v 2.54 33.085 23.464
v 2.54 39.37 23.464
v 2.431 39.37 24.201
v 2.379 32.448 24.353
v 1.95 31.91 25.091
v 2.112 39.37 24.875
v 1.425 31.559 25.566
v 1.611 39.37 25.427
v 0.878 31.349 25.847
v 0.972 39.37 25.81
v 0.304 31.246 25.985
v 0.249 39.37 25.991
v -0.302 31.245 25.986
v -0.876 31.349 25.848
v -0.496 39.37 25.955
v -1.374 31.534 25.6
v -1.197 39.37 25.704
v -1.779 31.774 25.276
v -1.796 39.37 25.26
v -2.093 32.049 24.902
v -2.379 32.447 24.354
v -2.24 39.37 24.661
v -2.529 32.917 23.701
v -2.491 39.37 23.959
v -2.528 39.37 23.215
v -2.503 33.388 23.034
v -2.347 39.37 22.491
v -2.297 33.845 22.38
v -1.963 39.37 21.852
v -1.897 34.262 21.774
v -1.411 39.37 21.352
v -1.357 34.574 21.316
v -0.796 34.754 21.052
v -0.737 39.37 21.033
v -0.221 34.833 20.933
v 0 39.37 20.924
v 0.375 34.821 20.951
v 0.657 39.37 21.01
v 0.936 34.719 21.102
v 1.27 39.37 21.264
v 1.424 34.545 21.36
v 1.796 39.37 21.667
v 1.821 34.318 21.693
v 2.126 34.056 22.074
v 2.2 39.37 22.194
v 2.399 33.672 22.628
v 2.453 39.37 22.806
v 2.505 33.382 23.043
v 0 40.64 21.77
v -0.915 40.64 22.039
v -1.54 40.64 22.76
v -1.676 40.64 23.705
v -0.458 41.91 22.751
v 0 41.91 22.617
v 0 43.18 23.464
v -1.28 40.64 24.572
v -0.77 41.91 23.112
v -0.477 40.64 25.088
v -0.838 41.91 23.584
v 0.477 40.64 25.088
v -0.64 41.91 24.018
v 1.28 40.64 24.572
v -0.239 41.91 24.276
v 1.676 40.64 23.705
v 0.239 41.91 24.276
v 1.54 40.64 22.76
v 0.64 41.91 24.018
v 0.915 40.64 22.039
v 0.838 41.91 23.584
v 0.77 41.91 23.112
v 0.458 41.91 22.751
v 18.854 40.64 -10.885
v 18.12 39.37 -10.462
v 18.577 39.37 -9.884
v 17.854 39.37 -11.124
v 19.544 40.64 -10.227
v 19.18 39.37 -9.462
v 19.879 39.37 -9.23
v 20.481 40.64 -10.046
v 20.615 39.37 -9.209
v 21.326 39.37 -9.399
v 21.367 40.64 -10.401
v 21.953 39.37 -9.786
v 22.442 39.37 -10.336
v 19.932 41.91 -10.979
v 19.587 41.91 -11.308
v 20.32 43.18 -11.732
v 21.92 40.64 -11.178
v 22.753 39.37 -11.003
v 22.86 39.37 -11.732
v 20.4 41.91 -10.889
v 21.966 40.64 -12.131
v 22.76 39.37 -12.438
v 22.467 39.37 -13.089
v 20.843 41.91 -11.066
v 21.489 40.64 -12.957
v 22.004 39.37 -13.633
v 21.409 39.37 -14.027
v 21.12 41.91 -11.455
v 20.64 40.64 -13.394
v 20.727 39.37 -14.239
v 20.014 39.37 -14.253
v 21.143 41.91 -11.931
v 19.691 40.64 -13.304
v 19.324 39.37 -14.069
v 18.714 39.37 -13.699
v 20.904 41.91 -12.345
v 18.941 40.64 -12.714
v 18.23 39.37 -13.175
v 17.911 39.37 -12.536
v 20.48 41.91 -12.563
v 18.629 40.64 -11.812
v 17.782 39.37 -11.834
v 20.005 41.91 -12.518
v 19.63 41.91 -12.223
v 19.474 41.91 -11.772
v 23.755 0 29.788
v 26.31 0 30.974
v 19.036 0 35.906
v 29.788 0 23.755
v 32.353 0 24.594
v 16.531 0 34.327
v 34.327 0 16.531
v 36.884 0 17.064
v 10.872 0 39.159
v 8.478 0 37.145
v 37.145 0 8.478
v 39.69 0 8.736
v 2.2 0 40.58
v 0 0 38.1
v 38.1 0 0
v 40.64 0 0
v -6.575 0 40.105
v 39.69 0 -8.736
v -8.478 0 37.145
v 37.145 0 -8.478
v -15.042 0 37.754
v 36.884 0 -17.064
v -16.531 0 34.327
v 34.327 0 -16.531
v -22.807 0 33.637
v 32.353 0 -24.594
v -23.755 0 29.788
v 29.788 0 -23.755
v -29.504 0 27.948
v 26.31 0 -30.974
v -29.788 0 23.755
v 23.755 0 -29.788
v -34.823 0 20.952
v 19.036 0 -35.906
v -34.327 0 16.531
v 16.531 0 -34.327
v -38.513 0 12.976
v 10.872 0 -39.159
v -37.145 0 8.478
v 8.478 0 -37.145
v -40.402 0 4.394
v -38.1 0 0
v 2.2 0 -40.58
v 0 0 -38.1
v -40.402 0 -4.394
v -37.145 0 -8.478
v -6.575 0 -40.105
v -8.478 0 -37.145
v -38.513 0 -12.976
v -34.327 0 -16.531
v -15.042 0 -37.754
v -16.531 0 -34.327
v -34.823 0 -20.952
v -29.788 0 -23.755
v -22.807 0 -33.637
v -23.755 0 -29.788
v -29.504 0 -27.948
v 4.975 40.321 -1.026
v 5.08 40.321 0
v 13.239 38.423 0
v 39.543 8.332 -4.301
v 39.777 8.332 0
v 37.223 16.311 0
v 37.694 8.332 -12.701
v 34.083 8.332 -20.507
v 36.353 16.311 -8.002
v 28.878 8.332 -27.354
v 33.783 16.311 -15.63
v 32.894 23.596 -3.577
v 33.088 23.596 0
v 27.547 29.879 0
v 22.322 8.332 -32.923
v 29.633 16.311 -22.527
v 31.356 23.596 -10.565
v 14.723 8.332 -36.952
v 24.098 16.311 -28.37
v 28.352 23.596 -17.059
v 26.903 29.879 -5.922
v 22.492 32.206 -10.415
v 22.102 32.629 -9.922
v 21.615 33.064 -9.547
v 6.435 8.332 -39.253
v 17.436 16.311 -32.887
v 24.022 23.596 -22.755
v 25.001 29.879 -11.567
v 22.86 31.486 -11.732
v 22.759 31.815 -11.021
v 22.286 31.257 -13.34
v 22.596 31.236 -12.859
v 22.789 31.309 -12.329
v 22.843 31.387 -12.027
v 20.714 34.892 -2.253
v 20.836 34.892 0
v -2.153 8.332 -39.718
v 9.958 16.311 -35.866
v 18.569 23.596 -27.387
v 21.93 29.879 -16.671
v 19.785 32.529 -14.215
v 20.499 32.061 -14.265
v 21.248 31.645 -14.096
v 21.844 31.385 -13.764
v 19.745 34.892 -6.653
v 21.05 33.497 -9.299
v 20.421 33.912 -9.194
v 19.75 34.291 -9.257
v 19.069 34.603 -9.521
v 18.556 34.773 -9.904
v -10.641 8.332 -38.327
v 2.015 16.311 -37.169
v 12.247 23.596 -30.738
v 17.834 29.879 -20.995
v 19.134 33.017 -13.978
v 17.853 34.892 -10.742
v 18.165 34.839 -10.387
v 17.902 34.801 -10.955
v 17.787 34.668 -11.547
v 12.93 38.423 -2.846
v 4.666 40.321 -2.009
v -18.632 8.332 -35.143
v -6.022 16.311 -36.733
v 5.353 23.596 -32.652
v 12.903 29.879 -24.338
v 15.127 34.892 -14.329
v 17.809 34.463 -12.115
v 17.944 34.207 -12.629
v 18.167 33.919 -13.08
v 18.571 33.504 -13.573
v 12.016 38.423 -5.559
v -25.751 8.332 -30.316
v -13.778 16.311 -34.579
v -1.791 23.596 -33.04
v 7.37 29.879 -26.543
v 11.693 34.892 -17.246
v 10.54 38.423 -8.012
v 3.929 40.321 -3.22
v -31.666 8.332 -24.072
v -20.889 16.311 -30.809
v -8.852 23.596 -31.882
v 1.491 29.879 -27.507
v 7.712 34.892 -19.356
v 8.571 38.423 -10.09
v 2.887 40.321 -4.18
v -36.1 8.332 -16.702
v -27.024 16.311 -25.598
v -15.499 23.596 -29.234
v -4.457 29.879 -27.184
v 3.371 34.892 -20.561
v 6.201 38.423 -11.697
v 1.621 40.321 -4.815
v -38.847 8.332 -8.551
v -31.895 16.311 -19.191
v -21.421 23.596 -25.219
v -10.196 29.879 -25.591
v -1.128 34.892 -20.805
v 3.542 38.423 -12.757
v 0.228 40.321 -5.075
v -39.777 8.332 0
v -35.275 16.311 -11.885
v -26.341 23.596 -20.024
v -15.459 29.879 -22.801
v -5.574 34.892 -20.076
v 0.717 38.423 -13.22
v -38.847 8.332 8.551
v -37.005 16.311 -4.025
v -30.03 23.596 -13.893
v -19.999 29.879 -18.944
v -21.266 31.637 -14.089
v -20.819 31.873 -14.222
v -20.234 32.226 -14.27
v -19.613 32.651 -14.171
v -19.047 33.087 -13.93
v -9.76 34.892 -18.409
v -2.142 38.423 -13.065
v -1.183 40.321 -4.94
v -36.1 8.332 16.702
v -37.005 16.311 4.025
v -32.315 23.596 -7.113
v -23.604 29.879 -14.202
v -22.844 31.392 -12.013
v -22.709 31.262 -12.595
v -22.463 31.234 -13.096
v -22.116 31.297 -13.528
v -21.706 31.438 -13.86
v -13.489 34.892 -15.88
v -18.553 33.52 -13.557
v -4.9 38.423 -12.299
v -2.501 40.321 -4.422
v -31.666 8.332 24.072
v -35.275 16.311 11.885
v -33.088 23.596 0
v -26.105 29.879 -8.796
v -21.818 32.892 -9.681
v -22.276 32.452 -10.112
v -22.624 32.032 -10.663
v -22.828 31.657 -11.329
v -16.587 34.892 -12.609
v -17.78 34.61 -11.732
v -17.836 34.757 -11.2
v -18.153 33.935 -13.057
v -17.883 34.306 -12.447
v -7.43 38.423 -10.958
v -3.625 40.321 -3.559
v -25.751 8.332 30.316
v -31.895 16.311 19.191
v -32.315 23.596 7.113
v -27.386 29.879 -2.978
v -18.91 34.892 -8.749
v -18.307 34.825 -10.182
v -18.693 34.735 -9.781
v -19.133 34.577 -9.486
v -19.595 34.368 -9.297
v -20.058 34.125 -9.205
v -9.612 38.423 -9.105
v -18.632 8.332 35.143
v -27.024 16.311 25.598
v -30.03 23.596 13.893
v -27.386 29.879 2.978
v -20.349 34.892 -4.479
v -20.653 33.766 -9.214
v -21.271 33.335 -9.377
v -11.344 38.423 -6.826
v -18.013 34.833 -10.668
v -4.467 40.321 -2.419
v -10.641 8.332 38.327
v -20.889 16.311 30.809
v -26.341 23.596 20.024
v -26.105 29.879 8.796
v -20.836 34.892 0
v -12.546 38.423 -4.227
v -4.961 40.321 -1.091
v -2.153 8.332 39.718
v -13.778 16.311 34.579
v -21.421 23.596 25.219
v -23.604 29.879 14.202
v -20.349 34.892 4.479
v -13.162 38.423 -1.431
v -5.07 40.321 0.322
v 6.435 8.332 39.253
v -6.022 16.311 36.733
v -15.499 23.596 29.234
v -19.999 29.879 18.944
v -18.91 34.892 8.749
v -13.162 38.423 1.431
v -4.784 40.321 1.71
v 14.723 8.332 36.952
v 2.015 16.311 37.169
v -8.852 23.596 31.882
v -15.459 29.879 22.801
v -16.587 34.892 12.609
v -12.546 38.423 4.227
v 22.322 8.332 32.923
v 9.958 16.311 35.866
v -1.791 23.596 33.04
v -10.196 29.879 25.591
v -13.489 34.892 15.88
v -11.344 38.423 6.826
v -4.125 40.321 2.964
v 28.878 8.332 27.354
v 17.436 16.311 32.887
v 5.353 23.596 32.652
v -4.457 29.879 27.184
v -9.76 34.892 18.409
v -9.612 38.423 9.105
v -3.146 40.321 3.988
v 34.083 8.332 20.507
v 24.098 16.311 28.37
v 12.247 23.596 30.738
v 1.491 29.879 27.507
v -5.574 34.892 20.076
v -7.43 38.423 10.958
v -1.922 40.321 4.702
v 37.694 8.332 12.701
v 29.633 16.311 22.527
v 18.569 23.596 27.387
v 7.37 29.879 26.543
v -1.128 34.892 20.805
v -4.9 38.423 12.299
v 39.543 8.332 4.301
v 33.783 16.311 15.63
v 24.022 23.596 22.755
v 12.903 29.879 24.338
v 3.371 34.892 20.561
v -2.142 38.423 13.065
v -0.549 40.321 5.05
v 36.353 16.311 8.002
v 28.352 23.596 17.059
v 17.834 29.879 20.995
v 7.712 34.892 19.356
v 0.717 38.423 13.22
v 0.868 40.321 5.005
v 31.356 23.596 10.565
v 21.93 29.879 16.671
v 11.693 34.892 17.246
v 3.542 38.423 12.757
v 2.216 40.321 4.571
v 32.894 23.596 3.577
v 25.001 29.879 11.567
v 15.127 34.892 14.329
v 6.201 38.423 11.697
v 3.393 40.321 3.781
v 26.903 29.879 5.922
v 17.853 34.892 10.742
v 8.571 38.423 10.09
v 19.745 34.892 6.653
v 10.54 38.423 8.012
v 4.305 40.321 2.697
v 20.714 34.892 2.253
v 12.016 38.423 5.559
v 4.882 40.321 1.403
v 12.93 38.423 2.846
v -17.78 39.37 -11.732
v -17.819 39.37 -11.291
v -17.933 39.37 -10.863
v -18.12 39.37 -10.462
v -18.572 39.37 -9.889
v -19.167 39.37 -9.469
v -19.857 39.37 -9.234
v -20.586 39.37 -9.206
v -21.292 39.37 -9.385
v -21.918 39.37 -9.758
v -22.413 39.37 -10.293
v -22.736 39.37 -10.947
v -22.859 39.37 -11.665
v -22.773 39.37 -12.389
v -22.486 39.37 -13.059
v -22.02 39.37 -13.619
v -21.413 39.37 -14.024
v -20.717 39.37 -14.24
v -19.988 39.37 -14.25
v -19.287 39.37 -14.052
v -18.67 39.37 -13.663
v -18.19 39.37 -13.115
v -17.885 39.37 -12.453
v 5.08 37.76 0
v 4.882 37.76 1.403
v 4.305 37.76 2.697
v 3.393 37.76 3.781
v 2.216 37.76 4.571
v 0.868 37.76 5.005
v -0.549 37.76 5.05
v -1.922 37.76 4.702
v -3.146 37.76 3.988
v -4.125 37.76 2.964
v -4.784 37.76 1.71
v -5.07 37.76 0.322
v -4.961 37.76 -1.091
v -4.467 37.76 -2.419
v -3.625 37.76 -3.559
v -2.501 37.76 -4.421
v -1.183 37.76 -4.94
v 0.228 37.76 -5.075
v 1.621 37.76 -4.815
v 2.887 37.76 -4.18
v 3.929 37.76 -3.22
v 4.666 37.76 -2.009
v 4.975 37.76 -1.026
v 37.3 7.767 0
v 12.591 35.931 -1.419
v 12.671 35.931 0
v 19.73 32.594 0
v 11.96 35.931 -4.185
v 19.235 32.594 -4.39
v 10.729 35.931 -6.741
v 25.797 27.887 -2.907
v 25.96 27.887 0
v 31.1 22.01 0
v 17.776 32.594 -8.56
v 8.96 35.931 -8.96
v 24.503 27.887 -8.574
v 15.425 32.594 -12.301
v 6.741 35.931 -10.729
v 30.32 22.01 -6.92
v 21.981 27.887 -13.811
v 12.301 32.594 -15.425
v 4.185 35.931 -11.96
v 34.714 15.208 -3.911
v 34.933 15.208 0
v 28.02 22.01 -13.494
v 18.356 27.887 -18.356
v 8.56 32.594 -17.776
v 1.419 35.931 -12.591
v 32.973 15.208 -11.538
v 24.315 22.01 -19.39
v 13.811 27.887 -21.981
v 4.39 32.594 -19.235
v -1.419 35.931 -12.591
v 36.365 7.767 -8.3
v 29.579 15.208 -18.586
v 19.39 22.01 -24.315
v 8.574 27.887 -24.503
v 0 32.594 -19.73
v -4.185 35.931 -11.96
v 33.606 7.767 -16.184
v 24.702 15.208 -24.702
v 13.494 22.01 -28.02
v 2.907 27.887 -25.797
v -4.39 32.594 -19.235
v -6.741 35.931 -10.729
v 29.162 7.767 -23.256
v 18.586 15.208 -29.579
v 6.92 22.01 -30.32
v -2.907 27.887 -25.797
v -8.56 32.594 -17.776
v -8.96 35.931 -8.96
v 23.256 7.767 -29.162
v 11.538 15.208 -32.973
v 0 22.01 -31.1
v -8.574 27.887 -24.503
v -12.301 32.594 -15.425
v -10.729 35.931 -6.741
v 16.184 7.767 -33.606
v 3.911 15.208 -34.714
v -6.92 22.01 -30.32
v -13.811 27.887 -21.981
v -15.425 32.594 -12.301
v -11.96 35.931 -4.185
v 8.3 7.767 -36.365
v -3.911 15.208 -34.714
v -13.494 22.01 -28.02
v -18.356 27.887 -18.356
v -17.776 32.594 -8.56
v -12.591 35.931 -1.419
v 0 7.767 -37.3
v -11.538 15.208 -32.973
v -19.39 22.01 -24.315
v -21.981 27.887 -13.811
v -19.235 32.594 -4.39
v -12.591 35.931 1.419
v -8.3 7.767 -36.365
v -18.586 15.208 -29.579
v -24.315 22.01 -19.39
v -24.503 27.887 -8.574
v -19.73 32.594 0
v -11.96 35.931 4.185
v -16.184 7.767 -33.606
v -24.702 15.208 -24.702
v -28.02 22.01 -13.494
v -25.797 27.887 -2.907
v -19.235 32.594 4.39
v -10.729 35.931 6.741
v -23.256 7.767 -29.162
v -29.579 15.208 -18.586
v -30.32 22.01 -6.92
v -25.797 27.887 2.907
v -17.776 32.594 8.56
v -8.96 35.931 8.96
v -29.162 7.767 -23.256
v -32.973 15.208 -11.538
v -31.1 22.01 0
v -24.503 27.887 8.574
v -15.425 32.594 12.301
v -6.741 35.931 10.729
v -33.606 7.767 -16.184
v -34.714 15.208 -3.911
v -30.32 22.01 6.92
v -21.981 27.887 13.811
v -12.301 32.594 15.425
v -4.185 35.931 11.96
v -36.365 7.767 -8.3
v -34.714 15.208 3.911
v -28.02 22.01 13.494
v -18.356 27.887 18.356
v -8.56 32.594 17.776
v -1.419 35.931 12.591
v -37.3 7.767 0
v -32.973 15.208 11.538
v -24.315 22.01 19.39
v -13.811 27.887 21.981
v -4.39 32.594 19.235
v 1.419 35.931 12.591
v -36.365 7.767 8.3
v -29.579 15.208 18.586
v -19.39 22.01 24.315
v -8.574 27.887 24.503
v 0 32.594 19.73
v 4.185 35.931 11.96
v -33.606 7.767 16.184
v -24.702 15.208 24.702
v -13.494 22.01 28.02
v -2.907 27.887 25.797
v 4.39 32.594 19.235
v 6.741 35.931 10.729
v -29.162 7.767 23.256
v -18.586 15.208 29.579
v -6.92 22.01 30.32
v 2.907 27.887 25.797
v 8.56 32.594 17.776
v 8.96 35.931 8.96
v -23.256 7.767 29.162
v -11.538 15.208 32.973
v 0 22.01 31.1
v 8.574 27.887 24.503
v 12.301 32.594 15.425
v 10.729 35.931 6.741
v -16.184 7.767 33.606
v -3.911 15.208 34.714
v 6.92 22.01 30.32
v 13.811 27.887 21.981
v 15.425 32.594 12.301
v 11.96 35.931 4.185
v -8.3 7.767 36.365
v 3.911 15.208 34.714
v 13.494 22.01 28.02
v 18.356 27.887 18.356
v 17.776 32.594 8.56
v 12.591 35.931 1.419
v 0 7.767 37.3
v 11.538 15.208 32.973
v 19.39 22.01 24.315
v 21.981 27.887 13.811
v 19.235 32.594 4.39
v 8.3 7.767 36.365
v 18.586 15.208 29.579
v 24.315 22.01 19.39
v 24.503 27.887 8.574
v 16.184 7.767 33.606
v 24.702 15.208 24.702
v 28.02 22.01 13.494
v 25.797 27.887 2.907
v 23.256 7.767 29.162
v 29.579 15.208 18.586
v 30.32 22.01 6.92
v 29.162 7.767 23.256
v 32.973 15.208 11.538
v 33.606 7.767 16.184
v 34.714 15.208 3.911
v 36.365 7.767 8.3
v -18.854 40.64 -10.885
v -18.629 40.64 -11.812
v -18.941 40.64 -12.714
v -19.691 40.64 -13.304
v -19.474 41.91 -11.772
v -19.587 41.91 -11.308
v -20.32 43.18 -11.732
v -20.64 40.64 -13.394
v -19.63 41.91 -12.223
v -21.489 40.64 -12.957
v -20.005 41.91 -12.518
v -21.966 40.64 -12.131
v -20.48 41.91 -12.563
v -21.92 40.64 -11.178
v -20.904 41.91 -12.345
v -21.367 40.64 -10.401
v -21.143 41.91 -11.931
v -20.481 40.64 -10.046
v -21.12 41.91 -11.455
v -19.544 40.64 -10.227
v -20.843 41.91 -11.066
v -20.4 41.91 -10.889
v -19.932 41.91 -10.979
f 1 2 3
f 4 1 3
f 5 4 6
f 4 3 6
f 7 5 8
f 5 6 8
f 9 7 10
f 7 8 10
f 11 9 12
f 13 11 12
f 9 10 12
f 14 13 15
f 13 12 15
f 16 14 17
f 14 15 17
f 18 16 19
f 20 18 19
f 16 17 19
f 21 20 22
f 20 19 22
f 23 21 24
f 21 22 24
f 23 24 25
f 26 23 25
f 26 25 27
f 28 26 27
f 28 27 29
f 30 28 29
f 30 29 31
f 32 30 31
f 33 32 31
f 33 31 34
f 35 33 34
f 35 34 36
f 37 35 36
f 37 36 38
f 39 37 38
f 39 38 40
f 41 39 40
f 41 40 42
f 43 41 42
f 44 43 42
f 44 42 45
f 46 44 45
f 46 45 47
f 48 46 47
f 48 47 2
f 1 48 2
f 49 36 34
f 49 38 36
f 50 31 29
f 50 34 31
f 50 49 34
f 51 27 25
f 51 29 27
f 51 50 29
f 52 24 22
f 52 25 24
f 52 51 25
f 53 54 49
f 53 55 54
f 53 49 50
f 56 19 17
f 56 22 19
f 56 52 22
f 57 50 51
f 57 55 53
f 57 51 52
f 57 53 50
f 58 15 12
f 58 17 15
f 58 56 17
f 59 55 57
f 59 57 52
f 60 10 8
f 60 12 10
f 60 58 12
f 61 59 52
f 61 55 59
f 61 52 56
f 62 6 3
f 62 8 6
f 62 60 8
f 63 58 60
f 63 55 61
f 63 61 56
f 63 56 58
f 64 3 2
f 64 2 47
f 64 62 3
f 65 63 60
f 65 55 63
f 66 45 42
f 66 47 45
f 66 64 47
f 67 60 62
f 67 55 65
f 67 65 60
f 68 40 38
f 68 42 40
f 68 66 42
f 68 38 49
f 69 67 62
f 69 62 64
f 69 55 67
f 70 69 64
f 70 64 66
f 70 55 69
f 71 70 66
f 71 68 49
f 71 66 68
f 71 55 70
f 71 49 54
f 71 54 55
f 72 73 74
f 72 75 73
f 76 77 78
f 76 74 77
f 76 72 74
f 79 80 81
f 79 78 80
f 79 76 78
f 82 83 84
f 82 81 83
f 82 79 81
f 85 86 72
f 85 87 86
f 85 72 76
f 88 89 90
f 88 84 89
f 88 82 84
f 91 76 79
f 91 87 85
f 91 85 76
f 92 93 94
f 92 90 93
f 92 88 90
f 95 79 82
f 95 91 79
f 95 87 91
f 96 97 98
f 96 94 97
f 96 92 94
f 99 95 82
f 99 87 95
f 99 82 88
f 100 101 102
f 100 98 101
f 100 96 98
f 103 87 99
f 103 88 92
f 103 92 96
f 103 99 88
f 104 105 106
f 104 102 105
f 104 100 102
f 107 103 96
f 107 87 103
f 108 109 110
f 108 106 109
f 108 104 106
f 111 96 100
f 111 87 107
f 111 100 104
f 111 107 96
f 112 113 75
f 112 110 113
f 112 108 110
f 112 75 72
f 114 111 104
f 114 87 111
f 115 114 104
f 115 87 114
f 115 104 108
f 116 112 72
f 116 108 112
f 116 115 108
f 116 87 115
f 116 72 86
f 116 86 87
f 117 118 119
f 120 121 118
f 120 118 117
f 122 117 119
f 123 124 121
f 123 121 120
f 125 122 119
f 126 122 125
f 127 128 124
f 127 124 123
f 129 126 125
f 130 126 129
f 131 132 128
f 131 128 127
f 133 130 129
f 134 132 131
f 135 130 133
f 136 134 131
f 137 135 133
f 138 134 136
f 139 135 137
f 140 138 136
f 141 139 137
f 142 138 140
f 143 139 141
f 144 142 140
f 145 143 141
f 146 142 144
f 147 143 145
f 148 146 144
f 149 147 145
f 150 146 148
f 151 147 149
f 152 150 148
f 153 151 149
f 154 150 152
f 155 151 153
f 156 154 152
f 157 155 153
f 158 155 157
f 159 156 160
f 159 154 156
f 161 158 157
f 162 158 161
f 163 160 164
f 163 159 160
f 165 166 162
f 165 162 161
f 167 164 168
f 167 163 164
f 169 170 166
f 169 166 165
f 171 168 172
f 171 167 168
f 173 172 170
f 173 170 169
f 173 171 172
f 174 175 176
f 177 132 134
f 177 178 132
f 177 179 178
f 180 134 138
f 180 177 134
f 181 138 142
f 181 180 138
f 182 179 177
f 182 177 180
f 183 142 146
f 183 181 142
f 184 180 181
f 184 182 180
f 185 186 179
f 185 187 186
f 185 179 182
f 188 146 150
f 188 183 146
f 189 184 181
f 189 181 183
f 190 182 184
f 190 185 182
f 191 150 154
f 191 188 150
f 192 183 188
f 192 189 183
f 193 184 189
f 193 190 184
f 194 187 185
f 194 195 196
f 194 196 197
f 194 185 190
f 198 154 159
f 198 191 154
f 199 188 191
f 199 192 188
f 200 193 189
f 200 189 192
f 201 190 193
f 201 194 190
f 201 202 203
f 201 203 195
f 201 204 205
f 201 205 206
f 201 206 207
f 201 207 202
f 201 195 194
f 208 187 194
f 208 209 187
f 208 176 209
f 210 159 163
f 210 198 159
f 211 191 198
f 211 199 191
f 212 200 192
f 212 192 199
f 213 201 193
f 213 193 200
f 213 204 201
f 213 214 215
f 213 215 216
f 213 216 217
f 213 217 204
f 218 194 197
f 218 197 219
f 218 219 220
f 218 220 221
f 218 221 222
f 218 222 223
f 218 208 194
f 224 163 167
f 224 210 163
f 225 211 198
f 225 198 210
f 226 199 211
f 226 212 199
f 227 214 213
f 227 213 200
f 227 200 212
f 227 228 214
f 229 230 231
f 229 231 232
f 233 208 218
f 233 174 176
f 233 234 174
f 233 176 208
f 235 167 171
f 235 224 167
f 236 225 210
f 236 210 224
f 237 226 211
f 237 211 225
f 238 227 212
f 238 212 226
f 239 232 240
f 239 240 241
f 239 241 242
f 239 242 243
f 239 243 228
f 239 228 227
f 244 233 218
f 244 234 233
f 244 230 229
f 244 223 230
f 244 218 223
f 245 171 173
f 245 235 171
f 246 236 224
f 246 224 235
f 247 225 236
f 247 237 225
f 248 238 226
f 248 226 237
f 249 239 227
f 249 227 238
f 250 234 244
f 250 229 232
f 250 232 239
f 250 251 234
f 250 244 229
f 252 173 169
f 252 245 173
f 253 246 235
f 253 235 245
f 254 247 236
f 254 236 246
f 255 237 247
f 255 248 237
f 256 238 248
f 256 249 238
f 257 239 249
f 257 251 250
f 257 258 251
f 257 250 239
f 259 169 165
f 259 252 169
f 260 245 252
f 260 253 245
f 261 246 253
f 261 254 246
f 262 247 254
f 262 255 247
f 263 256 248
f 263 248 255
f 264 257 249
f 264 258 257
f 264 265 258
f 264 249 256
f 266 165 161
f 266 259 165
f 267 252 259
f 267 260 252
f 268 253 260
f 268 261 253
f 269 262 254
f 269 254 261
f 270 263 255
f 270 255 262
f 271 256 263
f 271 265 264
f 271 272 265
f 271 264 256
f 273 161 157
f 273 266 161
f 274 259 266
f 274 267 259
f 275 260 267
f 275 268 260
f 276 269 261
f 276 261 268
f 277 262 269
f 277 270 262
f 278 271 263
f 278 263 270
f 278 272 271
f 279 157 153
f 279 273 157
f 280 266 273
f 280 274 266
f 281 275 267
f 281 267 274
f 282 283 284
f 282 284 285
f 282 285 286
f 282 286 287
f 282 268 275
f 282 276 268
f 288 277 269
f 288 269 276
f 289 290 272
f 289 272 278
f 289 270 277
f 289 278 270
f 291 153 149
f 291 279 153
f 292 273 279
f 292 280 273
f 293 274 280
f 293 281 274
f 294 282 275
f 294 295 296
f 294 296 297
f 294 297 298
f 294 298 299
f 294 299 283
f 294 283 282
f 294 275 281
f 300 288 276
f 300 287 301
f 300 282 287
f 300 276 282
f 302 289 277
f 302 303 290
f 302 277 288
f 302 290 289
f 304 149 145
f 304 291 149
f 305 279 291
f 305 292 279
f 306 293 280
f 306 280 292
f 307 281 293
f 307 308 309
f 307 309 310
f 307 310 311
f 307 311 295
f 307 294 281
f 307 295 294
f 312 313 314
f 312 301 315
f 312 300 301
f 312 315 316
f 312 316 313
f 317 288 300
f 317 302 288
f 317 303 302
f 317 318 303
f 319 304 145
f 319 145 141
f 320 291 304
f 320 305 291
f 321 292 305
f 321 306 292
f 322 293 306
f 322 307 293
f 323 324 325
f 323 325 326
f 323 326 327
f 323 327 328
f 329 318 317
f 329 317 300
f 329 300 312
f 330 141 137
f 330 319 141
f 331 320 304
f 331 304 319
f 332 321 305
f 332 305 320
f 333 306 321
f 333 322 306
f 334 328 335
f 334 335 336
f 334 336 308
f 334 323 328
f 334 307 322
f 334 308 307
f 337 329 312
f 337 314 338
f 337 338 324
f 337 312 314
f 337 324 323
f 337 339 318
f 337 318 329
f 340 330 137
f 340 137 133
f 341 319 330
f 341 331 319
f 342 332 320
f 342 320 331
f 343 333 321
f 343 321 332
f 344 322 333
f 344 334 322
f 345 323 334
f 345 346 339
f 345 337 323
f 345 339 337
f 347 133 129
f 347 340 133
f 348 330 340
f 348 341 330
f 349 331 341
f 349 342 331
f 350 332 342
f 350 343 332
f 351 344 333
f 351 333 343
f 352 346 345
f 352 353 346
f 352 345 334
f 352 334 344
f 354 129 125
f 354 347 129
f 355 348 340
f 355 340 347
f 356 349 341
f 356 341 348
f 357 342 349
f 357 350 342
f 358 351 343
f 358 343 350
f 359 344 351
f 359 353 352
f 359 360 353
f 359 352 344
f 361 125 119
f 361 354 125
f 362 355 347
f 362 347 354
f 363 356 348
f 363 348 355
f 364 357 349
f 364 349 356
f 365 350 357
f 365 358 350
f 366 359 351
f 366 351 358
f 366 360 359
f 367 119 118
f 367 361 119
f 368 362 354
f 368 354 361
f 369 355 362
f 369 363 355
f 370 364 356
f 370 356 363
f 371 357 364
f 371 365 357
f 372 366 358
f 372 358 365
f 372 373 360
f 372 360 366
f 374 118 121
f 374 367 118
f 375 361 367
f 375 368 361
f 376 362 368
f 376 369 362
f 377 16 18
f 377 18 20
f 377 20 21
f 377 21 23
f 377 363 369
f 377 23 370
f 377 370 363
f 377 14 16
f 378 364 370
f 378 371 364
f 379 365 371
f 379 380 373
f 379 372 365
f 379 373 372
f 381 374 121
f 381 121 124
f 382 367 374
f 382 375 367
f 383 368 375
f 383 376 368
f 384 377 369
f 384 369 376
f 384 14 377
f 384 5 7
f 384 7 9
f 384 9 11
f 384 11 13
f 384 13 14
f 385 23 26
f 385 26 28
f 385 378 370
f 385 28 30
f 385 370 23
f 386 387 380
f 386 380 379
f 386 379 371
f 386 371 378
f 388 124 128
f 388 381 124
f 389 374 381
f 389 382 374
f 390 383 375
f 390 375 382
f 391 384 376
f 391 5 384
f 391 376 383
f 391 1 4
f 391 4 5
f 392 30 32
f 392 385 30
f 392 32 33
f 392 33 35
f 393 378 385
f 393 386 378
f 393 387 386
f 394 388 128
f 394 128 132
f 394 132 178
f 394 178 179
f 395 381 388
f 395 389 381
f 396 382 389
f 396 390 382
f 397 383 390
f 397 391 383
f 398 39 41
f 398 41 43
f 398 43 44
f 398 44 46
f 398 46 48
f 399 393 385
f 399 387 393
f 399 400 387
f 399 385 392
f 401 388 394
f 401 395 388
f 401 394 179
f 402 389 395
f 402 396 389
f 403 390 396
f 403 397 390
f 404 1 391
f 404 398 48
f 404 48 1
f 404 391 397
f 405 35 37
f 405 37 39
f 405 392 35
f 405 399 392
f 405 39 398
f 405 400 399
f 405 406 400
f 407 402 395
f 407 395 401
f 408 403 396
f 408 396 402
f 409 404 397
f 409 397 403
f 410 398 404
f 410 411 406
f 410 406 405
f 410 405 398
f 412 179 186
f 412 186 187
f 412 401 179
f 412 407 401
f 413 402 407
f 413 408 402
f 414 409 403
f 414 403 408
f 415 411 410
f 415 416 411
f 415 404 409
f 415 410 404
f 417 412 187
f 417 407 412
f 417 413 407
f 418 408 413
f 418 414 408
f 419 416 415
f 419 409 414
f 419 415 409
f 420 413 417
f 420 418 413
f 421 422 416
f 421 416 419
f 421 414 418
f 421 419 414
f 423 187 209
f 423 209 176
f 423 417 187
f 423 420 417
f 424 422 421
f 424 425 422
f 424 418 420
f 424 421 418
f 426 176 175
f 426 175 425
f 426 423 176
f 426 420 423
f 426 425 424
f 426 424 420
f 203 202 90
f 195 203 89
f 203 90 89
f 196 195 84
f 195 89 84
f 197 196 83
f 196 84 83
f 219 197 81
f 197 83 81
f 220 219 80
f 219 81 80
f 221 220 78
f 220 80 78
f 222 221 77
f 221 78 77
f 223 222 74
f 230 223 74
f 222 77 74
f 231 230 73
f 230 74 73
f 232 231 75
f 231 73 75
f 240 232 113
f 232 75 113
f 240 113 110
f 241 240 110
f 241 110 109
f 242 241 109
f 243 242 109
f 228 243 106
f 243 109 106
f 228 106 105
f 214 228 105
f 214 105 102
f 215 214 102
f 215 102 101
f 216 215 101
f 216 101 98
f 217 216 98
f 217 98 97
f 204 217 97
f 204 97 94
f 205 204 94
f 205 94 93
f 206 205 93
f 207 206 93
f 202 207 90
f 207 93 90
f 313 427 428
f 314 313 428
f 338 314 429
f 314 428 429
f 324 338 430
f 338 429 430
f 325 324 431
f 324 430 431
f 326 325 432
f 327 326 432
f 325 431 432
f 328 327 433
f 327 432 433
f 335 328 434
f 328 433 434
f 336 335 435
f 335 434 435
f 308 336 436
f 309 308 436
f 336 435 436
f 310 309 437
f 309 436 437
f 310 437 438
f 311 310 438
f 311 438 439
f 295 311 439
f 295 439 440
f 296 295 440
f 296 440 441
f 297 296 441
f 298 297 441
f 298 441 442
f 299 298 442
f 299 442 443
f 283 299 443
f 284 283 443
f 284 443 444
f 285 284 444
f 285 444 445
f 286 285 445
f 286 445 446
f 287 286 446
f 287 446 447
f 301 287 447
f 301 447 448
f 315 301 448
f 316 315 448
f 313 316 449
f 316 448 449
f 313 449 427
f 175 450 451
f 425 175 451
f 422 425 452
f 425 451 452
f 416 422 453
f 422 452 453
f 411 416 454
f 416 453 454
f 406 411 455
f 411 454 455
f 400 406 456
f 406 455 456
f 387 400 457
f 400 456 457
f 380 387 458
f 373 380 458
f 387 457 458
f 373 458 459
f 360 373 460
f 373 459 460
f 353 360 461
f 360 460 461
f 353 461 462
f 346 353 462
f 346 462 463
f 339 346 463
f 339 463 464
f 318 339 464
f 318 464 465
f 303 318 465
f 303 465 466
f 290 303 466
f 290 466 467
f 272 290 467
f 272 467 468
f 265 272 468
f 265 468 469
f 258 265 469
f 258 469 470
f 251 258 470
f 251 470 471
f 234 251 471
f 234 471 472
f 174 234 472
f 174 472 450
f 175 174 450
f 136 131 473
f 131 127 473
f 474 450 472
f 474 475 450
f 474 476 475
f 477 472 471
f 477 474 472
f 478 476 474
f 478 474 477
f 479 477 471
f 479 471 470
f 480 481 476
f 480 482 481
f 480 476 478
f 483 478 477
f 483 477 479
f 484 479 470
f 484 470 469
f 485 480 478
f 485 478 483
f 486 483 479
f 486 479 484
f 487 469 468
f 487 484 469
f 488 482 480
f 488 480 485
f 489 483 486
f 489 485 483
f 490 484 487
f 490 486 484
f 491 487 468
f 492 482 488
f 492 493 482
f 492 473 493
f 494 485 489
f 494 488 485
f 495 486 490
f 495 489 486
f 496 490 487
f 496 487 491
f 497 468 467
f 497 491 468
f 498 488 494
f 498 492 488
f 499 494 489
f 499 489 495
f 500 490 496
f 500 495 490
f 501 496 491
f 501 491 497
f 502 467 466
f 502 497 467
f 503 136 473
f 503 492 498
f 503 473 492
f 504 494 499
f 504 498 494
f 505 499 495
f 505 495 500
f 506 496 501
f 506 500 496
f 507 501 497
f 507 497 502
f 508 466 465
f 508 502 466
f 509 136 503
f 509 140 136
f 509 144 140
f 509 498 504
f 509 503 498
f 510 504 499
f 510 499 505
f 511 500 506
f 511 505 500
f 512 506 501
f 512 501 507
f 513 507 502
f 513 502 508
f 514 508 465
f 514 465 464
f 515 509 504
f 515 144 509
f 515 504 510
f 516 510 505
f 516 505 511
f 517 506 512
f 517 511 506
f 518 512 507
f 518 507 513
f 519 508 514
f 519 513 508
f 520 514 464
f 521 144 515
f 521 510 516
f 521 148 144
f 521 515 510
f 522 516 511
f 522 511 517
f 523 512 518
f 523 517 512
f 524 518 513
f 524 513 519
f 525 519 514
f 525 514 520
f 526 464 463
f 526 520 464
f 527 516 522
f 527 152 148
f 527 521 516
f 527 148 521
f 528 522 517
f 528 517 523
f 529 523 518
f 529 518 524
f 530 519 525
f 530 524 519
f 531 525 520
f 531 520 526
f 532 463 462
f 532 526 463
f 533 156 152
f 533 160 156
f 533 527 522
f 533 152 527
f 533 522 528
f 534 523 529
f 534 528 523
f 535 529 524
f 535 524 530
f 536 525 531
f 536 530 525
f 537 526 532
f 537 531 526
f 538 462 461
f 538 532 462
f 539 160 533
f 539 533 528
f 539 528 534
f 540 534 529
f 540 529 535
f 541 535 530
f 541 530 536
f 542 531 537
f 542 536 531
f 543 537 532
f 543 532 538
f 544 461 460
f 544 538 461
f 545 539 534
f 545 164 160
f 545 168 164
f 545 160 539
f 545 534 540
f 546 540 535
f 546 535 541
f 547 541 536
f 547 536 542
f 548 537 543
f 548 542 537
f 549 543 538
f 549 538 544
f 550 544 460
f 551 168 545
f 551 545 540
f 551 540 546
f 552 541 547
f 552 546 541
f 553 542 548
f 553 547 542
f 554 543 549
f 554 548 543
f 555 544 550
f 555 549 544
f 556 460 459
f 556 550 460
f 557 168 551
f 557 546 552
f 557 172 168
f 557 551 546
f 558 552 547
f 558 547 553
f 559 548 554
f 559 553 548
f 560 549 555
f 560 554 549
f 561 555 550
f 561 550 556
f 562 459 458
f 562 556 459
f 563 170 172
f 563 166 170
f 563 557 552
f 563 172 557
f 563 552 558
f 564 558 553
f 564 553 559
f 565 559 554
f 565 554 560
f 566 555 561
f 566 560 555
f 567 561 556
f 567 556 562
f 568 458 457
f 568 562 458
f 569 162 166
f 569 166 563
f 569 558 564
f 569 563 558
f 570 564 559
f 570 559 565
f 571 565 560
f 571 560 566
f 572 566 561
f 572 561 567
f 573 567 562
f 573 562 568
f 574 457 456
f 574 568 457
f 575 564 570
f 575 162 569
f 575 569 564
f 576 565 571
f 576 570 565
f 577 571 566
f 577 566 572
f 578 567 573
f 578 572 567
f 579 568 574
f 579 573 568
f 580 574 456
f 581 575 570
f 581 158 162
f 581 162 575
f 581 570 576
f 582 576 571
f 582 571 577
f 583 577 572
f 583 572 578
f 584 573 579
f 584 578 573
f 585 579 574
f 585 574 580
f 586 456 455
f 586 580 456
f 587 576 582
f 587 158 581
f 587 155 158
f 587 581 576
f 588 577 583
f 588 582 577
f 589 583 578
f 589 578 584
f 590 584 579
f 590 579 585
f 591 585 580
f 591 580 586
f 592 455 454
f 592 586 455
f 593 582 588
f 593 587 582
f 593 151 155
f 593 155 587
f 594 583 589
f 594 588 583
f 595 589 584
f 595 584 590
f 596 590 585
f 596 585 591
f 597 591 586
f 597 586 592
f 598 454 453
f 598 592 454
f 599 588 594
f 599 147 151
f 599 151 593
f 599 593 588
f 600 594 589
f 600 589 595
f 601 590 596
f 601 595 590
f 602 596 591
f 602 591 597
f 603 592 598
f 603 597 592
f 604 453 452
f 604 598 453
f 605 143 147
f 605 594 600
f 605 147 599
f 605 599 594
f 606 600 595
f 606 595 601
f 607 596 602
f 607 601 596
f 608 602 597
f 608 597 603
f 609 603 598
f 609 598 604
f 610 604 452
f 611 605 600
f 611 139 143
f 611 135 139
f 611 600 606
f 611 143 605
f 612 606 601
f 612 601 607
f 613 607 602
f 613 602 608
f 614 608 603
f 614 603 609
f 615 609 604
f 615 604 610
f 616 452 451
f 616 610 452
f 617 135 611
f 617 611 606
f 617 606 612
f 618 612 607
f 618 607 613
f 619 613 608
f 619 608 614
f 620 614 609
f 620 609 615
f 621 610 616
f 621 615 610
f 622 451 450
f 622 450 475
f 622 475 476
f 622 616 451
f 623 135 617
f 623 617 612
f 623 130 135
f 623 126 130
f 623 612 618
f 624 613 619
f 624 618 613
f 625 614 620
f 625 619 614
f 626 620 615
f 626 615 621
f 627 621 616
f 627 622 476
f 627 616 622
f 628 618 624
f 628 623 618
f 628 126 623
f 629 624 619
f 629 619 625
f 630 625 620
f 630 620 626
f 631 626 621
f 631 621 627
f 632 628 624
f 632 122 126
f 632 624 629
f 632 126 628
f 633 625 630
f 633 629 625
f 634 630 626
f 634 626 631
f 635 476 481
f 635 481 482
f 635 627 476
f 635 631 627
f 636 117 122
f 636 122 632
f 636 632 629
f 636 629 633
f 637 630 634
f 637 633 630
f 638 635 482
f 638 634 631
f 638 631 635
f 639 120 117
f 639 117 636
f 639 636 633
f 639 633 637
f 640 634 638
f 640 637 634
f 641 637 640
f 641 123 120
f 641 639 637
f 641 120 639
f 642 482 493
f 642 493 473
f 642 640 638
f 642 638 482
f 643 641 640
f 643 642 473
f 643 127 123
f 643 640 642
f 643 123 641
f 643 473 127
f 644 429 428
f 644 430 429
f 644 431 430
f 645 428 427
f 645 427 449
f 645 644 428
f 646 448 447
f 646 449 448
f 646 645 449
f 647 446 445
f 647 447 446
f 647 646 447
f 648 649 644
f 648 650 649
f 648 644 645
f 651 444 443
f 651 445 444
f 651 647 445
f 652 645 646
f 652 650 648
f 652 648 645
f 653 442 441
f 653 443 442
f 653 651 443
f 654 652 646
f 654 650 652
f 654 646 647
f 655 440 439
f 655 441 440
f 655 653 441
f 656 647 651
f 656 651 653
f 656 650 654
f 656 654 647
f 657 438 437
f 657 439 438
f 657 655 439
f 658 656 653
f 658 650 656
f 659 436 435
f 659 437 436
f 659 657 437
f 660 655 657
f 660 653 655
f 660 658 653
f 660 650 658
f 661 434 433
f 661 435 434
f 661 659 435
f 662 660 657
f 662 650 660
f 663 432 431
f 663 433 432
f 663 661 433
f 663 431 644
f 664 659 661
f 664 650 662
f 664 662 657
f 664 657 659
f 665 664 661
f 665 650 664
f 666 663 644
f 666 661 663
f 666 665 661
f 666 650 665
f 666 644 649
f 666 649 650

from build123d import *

# Parameters (mm, degrees)
EXTRUDE1_REACH    = 41.37
SKETCH2_R         = 2.54
SKETCH4_R         = 5.08
EXTRUDE3_DEPTH    = 41.64
CIRPATTERN1_COUNT = 3


with BuildPart() as part:
    # Sketch1 → Revolve1 (revolve)
    with BuildSketch(Plane.XY):
        with BuildLine():
            Line((38.1, 0), (40.64, 0))
            ThreePointArc((40.64, 0), (28.736819587, 28.736819587), (0, 40.64))
            Line((0, 40.64), (0, 38.1))
            ThreePointArc((0, 38.1), (26.940768363, 26.940768363), (38.1, 0))
        make_face()
    revolve(axis=Axis((0, 38.1, 0), (0, 1, 0)))

    # Sketch2 → Extrude1 (add, up to next)
    with BuildSketch(Plane.XZ.offset(-39.37), mode=Mode.PRIVATE) as extrude1_sk1:
        with Locations((0, 23.46351494)):
            Circle(SKETCH2_R)
    extrude1_tool1 = extrude(extrude1_sk1.sketch, amount=EXTRUDE1_REACH, mode=Mode.PRIVATE) - part.part
    add(extrude1_tool1.solids().sort_by_distance((0, 39.37, 23.463515))[0])
    # Sketch2 → Extrude1 (add, up to next)
    with BuildSketch(Plane.XZ.offset(-39.37), mode=Mode.PRIVATE) as extrude1_sk2:
        with Locations((-20.32, -11.73175747)):
            Circle(SKETCH2_R)
    extrude1_tool2 = extrude(extrude1_sk2.sketch, amount=EXTRUDE1_REACH, mode=Mode.PRIVATE) - part.part
    add(extrude1_tool2.solids().sort_by_distance((-20.32, 39.37, -11.731757))[0])
    # Sketch2 → Extrude1 (add, up to next)
    with BuildSketch(Plane.XZ.offset(-39.37), mode=Mode.PRIVATE) as extrude1_sk3:
        with Locations((20.32, -11.73175747)):
            Circle(SKETCH2_R)
    extrude1_tool3 = extrude(extrude1_sk3.sketch, amount=EXTRUDE1_REACH, mode=Mode.PRIVATE) - part.part
    add(extrude1_tool3.solids().sort_by_distance((20.32, 39.37, -11.731757))[0])

    # Sketch4 → Extrude3 (cut, through all)
    with BuildSketch(Plane.XZ):
        Circle(SKETCH4_R)
    extrude(amount=-EXTRUDE3_DEPTH, mode=Mode.SUBTRACT)

    # Sketch5 → Revolve2 (revolve)
    with BuildSketch(Plane(origin=(0, 0, 0), x_dir=(0, 0, -1), z_dir=(1, 0, 0))):
        Polygon((-20.92351494, 39.37), (-23.46351494, 43.18), (-23.46351494, 39.37), align=None)
    revolve2 = revolve(axis=Axis((0, 39.37, 23.46351494), (0, 1, 0)))

    # CirPattern1: Revolve2 ×3 about axis
    cirpattern1_axis = Axis((0, 0, 0), (0, 1, 0))
    for i in range(1, CIRPATTERN1_COUNT):
        add(revolve2.rotate(cirpattern1_axis, i * 360 / CIRPATTERN1_COUNT))


solid = part.part
